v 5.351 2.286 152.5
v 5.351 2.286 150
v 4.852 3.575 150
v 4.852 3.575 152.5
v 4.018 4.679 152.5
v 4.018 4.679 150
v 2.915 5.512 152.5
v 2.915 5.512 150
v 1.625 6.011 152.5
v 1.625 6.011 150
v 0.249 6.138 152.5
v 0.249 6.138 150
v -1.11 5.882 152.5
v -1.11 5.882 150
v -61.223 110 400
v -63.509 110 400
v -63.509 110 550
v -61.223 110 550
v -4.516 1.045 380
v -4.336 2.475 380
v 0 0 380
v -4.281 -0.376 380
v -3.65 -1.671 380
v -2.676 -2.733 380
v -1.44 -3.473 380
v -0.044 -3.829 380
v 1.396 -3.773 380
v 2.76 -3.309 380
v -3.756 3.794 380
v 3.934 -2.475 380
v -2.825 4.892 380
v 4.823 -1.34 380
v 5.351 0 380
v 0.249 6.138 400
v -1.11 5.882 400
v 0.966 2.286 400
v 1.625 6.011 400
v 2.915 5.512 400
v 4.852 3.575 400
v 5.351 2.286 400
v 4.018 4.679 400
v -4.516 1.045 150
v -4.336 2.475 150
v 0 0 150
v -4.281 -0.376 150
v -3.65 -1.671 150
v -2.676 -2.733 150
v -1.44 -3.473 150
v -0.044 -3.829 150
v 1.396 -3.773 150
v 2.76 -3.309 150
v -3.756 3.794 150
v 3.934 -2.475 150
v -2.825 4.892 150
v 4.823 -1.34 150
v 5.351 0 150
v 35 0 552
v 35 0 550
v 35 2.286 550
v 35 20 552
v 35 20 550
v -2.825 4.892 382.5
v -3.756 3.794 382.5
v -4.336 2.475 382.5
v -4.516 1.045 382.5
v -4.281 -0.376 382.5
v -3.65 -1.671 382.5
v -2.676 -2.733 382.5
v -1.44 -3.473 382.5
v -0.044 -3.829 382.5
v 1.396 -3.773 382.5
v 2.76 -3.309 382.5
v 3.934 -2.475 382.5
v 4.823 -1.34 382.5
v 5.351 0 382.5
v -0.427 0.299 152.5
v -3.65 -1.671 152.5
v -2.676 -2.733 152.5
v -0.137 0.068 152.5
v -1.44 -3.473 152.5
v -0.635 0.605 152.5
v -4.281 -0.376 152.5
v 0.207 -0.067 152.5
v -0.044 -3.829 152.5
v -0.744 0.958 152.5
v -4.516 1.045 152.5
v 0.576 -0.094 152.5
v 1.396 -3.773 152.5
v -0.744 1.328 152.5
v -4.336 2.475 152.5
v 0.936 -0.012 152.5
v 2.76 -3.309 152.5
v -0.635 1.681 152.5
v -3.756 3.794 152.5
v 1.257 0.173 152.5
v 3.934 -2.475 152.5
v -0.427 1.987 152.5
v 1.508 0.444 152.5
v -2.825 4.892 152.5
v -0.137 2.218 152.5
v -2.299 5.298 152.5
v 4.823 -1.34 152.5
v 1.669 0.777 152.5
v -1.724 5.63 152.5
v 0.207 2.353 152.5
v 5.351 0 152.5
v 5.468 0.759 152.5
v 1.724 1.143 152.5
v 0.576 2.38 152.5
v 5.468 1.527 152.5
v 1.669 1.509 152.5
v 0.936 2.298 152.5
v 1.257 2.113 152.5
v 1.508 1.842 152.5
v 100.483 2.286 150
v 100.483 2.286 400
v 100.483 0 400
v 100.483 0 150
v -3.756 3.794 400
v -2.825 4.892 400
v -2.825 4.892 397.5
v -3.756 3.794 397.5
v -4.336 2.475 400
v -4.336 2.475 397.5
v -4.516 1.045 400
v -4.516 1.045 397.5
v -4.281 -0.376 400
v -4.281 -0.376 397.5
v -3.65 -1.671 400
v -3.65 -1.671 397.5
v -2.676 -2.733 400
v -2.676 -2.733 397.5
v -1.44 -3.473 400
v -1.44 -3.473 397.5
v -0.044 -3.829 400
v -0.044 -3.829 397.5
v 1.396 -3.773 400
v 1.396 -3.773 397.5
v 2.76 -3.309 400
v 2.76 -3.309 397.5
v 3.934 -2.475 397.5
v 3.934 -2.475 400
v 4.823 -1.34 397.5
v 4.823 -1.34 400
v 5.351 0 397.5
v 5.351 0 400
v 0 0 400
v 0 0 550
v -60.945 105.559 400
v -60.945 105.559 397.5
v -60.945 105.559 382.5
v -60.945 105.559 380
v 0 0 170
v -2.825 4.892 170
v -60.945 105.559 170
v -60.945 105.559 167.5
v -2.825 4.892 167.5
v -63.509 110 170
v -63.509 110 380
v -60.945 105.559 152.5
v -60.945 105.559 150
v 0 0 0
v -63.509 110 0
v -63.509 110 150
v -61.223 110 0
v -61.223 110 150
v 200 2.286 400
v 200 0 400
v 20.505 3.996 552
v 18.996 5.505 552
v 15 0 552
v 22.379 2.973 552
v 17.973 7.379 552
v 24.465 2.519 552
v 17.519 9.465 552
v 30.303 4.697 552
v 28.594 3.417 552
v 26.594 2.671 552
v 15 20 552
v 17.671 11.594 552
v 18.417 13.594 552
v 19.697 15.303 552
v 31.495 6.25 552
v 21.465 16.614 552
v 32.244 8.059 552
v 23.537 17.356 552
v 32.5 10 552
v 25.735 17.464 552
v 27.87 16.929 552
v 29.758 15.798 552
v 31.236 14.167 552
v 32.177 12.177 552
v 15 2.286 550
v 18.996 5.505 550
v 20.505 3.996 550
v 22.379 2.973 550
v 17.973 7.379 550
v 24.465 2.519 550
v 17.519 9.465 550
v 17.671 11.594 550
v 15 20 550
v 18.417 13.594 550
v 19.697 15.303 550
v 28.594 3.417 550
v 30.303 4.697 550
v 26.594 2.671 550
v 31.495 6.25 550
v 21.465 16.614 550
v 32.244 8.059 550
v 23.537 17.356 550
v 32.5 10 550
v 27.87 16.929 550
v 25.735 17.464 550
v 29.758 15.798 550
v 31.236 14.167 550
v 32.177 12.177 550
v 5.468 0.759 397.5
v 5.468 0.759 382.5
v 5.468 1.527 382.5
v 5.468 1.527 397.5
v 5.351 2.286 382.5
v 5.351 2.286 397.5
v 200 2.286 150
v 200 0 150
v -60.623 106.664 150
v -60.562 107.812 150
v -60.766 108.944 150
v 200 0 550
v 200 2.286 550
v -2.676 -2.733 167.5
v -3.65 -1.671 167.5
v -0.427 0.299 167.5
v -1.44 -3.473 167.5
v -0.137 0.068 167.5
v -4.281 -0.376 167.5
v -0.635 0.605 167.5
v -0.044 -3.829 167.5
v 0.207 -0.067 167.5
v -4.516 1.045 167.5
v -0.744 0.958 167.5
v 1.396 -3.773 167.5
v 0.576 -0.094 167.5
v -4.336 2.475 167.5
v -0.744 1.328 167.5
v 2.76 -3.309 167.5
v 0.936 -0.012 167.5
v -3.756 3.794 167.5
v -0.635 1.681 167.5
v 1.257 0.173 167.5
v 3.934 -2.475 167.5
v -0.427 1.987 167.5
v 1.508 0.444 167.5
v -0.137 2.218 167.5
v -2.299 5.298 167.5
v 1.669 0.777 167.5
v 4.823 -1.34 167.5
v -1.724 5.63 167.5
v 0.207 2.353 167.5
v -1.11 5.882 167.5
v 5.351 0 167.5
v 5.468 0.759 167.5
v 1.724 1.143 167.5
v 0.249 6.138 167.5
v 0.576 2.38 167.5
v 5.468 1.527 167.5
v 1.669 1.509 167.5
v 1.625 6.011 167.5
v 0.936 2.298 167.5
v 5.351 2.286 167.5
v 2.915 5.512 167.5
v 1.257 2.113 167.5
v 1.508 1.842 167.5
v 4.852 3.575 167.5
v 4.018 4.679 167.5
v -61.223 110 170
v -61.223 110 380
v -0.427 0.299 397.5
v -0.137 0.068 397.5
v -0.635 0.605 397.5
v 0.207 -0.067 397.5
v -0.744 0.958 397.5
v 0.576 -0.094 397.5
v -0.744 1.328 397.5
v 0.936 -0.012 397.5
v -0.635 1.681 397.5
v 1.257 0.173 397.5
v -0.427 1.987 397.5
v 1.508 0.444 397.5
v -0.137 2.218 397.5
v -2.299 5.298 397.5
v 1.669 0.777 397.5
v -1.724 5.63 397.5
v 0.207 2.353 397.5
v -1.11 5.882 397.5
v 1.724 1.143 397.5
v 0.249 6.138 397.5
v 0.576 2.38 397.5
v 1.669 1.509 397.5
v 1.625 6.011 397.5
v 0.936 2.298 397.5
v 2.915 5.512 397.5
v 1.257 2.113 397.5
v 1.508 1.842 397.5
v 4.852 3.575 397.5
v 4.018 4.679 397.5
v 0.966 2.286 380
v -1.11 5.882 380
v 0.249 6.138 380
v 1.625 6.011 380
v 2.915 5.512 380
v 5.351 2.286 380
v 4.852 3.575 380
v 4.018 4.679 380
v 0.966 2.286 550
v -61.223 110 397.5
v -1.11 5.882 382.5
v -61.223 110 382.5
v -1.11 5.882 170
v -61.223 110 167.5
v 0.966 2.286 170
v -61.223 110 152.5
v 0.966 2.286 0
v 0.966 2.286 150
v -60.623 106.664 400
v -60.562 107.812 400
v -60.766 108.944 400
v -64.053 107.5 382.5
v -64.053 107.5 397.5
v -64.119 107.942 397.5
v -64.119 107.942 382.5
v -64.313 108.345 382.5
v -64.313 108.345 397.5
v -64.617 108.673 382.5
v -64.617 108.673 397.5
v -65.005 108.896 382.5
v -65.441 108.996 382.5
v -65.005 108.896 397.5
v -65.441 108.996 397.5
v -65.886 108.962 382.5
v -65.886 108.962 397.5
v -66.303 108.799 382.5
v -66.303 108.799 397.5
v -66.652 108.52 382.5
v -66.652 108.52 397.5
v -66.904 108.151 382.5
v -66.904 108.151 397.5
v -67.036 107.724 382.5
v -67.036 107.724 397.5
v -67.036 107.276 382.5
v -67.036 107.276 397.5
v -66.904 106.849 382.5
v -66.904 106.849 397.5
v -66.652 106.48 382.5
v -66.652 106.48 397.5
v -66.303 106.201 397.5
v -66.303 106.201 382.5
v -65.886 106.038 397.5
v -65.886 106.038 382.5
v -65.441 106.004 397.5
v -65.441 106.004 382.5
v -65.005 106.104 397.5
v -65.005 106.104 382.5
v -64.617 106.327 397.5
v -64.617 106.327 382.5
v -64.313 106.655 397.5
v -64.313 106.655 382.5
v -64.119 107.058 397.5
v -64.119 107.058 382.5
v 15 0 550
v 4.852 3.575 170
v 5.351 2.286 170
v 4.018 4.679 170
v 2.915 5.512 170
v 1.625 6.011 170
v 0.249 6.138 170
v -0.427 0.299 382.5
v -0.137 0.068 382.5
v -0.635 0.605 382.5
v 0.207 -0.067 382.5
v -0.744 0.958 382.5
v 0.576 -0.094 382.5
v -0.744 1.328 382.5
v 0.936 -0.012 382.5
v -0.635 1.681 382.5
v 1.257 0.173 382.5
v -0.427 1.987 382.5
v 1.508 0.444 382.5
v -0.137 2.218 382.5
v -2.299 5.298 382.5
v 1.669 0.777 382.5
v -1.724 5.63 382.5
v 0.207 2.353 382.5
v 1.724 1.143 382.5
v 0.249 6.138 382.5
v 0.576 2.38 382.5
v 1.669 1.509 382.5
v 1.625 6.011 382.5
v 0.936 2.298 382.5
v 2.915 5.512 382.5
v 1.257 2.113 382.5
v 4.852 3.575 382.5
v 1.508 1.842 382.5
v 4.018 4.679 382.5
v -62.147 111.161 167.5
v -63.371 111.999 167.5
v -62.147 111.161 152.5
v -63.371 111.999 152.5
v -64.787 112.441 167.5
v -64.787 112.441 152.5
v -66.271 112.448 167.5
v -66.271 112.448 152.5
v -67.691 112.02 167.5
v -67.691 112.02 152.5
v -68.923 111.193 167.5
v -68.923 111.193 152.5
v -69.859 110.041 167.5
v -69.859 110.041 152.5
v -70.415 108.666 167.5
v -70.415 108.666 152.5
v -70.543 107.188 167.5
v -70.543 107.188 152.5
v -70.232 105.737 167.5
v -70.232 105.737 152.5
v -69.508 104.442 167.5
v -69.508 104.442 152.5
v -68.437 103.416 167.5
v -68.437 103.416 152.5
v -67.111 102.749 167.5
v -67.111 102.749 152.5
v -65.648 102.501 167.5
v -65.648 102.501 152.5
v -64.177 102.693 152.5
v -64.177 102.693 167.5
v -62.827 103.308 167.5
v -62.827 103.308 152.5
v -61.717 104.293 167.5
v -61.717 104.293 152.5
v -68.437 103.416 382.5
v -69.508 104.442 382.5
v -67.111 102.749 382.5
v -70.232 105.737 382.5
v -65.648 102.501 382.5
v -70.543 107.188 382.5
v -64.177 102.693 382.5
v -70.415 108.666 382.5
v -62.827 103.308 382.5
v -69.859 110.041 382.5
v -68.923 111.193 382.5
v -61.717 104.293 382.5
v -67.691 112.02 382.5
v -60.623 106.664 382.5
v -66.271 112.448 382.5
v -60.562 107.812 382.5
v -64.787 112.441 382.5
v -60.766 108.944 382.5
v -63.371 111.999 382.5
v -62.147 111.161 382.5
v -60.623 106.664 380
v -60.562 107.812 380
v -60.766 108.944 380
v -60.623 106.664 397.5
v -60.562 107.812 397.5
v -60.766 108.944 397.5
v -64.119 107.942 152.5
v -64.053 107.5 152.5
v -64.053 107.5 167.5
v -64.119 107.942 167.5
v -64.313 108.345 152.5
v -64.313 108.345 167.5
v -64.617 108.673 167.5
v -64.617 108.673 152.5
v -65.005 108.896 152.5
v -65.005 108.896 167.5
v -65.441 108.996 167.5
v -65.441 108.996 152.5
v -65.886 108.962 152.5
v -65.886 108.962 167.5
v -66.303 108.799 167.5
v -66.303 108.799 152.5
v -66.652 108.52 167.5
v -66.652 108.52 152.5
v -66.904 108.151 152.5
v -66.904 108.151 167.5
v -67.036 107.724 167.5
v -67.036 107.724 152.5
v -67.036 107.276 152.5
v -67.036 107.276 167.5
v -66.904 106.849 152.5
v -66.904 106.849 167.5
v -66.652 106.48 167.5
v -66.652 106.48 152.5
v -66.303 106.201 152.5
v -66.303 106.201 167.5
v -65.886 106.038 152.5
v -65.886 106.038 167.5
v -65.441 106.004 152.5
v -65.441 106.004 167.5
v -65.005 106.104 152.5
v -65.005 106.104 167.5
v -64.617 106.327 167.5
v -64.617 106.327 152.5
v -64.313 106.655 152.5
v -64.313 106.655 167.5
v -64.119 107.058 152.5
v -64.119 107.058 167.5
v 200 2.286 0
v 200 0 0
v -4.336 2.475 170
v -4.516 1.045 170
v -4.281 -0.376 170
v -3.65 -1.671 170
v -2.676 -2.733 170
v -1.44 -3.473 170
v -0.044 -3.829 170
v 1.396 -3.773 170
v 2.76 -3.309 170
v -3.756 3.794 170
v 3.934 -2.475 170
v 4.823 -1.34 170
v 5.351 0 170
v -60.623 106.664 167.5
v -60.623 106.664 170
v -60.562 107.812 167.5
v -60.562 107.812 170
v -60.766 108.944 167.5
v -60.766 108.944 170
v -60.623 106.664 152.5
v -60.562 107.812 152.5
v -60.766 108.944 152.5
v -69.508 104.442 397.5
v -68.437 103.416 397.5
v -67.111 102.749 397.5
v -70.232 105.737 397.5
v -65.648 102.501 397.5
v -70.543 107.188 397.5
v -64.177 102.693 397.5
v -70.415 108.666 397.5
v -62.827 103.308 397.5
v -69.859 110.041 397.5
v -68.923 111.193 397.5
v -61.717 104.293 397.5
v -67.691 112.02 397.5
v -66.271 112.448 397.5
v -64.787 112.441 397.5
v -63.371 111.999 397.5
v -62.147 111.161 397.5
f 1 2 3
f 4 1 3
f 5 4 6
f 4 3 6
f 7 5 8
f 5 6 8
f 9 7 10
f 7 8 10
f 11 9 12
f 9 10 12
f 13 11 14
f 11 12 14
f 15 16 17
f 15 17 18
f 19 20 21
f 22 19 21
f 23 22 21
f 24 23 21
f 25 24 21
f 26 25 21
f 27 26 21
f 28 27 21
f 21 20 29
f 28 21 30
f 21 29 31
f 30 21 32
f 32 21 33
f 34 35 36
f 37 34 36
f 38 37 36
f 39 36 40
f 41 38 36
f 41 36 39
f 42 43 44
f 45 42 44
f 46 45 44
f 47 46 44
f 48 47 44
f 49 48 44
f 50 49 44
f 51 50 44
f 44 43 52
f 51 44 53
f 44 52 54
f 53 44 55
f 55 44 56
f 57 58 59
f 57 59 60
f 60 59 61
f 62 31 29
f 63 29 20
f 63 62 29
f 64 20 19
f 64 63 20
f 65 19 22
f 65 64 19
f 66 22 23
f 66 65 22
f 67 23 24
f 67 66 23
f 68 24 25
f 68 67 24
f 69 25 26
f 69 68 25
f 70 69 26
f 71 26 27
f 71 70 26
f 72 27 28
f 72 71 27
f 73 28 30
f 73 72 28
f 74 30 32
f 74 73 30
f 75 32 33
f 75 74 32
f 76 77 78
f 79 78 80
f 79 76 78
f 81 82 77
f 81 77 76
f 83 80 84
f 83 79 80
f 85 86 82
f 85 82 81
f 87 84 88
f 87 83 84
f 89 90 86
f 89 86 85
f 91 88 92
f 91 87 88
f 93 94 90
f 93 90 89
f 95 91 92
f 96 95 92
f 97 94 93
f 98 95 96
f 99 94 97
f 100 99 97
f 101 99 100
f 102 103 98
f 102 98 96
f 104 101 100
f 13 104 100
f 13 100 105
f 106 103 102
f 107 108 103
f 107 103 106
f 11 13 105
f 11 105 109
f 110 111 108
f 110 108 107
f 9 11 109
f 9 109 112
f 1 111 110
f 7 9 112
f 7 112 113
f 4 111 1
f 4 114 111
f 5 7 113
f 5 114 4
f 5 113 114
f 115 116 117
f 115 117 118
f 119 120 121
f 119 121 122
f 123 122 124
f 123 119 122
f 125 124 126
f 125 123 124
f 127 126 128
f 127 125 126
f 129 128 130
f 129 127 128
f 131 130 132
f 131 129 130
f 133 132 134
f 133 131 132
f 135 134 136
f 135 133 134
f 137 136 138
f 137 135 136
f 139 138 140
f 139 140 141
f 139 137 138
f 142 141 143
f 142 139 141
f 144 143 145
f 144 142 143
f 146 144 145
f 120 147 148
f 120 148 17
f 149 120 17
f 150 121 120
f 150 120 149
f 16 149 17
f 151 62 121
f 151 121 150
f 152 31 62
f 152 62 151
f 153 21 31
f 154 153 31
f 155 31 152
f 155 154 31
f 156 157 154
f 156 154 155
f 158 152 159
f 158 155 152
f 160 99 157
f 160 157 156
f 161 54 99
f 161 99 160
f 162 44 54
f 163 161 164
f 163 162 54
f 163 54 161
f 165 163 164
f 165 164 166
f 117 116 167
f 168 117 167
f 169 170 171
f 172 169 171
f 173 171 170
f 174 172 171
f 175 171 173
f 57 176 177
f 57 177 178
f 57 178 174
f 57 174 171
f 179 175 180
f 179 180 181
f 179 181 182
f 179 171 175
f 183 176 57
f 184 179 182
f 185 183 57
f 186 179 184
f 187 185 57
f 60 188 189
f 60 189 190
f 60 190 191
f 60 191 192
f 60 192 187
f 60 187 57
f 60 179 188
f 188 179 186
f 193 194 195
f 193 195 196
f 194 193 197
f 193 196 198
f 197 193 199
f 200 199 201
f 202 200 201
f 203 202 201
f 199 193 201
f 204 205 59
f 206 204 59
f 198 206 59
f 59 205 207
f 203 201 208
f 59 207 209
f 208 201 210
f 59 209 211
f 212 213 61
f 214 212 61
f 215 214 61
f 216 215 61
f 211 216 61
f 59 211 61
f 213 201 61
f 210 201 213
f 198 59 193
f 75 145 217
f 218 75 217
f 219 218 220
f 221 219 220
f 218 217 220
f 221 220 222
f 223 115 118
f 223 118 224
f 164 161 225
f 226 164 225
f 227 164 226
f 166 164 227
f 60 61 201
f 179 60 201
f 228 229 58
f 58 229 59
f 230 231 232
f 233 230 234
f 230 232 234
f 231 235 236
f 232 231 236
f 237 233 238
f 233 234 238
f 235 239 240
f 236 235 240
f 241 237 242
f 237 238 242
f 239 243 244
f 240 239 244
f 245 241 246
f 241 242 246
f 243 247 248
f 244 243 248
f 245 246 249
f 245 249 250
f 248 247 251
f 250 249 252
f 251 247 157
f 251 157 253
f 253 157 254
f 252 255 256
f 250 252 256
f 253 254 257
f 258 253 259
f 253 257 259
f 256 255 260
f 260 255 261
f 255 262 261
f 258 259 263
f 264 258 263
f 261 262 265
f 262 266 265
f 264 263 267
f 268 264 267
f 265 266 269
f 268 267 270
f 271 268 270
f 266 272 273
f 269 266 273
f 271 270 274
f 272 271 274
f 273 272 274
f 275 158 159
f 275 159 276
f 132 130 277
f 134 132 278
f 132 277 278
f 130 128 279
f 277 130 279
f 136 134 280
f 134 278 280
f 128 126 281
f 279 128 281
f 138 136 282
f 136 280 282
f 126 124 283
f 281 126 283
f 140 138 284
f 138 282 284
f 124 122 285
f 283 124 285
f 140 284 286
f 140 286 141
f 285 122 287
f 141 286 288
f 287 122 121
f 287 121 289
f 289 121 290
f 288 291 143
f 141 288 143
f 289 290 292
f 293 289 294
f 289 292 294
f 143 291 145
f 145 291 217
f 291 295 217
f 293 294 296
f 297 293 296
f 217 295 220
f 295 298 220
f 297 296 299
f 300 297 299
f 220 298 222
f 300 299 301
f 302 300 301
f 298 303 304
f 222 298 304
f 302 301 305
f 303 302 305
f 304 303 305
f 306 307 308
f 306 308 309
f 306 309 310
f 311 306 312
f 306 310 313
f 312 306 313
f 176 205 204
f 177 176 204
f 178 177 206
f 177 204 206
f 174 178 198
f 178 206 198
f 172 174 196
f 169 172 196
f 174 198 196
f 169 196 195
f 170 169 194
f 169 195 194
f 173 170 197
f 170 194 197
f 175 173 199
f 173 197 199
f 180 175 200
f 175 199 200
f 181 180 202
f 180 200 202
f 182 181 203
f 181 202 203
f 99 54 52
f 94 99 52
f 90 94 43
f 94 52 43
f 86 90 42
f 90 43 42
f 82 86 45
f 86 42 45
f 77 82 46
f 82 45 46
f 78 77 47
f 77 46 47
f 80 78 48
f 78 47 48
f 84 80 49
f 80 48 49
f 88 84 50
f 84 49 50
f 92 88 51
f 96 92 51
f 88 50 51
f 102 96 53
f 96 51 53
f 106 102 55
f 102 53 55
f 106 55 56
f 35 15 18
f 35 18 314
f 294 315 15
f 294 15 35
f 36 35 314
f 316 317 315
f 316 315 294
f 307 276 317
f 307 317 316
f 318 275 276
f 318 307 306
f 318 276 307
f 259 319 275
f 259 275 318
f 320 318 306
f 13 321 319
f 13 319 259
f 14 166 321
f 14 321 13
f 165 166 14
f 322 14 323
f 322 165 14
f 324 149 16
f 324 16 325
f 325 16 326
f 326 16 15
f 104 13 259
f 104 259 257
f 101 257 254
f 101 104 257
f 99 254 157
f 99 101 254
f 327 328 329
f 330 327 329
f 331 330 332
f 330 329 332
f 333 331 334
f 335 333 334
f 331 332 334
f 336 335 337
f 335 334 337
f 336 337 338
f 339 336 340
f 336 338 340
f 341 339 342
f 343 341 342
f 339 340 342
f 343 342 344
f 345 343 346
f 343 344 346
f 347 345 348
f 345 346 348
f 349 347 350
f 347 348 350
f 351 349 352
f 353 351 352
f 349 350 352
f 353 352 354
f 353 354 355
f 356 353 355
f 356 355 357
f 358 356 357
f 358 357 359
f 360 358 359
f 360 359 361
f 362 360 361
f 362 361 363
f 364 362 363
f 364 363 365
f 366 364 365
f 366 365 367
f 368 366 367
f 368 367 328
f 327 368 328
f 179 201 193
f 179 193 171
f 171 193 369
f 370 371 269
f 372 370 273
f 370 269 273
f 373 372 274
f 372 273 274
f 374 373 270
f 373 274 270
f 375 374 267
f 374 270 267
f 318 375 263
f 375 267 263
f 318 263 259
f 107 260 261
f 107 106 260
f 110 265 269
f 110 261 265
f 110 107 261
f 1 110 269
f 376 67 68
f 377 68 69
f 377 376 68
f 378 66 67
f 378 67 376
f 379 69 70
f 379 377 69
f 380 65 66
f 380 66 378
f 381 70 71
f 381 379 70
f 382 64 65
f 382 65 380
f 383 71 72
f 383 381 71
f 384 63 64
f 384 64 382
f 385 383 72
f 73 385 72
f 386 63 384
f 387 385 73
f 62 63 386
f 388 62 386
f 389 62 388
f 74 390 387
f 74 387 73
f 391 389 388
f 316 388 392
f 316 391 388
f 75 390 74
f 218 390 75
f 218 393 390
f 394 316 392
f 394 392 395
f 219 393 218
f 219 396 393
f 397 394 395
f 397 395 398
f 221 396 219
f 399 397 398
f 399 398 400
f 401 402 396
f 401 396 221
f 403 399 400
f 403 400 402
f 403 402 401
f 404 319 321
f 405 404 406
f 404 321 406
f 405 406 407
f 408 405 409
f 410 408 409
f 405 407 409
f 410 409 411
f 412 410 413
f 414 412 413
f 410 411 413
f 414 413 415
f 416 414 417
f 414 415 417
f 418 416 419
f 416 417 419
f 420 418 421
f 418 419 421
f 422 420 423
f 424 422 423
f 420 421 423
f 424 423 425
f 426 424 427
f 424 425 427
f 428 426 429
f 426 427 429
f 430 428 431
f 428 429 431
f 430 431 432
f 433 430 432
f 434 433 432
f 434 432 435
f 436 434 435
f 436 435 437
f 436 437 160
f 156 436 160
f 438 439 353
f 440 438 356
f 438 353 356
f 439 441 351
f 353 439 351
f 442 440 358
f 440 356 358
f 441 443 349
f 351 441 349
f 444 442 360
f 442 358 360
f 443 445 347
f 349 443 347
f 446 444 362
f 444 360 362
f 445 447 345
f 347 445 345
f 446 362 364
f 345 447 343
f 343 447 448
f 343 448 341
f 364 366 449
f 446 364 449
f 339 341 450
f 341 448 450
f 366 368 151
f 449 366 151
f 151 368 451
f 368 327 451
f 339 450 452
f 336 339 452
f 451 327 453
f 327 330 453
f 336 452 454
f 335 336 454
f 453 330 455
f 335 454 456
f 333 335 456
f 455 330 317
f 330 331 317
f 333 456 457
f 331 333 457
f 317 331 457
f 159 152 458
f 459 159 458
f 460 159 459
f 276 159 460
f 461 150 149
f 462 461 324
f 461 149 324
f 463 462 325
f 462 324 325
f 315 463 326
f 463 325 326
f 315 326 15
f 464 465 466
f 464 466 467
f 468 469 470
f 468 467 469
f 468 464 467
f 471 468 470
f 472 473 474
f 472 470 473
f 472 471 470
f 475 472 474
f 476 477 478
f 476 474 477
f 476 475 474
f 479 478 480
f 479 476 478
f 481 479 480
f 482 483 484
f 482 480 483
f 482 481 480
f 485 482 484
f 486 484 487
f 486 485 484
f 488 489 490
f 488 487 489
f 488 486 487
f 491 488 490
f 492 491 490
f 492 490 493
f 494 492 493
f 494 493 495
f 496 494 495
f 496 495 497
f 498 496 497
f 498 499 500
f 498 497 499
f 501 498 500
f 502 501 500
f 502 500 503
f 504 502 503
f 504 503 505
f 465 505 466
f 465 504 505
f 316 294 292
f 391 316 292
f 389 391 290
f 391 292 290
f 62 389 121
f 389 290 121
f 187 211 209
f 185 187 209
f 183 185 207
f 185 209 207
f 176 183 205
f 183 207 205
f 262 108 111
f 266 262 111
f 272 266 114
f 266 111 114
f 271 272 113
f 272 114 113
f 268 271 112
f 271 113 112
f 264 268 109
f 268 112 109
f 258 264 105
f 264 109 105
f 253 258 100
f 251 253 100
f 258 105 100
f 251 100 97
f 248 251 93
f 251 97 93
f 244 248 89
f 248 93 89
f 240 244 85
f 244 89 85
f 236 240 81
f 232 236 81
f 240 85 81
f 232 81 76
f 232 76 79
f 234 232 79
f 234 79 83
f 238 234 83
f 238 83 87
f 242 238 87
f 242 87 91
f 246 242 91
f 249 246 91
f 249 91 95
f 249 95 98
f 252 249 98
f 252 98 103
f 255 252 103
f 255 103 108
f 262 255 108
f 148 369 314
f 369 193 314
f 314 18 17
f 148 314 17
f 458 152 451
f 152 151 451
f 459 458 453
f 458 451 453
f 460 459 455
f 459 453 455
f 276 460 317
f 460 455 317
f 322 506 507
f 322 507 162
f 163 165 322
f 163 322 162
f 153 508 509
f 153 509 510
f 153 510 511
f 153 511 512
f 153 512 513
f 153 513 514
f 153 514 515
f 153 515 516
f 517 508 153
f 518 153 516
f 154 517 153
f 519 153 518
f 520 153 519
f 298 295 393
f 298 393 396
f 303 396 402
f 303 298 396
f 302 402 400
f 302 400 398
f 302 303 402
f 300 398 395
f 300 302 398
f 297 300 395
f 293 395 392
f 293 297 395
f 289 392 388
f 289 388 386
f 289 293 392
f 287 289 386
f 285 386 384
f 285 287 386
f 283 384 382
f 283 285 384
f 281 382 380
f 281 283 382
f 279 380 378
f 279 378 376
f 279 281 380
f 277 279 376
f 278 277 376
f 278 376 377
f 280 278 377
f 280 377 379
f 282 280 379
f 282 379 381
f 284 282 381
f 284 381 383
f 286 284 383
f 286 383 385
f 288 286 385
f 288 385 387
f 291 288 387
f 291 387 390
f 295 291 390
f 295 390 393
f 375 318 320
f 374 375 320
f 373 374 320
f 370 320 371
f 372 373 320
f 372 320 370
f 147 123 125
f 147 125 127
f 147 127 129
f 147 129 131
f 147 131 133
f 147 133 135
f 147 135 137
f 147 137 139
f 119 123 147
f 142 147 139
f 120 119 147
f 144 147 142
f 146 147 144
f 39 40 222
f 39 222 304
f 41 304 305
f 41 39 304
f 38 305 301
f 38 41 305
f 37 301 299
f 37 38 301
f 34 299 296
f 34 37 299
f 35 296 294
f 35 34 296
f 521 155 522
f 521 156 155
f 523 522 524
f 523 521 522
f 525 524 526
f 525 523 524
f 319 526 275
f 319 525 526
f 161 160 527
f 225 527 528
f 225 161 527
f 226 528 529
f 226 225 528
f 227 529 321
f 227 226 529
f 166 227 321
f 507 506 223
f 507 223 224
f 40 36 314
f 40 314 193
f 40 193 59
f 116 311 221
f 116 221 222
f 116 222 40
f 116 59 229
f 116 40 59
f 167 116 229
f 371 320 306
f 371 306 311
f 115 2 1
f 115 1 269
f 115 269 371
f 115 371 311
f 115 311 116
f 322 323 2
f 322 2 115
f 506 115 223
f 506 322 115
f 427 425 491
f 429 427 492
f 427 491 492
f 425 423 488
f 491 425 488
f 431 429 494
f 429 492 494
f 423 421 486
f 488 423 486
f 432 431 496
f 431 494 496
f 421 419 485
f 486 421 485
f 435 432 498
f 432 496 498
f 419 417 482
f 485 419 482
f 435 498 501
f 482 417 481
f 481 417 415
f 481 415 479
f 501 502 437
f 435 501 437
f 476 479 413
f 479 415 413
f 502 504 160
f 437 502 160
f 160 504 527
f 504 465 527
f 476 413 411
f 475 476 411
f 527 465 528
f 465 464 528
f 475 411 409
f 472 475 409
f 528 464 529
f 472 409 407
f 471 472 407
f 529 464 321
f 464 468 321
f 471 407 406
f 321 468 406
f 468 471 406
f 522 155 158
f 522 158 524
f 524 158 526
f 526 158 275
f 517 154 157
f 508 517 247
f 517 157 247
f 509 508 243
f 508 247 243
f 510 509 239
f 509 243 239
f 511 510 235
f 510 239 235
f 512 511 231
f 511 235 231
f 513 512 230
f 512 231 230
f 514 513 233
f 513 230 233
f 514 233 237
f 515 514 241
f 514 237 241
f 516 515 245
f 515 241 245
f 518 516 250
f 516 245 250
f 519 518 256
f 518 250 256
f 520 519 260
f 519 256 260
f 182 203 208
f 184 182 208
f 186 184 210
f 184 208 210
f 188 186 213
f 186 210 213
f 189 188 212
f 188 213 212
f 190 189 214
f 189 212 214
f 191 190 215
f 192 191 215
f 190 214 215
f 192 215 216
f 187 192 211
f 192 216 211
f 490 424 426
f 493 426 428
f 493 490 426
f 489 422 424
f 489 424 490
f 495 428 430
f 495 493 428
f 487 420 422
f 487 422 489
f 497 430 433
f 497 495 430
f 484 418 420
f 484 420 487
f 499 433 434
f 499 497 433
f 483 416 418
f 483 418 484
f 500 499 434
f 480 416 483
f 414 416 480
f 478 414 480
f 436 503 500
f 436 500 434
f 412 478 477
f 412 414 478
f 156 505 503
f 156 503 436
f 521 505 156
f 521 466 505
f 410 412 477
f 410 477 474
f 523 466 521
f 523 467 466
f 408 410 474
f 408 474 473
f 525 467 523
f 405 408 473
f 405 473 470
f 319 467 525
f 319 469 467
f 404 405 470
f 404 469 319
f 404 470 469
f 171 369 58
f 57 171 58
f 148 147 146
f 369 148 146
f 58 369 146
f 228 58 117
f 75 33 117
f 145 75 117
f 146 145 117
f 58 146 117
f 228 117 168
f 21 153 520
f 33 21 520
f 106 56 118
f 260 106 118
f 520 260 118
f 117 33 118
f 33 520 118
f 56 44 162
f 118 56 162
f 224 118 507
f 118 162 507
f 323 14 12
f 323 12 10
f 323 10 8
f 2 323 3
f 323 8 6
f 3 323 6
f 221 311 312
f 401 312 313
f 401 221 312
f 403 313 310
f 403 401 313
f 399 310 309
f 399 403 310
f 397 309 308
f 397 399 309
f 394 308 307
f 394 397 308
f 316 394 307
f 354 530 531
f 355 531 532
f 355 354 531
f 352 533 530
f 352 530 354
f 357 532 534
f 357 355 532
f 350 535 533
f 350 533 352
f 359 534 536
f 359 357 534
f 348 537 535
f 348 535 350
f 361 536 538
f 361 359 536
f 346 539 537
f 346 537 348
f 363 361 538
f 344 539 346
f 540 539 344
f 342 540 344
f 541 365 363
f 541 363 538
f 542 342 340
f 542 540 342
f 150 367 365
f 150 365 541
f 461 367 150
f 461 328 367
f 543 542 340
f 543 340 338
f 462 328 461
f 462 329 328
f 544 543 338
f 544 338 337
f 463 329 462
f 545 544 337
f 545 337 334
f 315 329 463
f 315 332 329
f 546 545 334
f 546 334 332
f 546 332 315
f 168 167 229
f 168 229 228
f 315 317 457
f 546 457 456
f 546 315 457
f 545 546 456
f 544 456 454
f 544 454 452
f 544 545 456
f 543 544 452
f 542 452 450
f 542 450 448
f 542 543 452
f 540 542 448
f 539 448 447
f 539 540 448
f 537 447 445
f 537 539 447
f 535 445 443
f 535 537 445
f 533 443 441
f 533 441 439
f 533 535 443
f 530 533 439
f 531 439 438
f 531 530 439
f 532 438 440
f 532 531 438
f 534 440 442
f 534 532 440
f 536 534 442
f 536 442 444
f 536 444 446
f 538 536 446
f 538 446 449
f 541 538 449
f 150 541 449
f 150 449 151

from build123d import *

# Parameters (mm, degrees)
BOSS_EXTRUDE1_DEPTH = 550
SKETCH2_W           = 99.516911358
SKETCH2_H           = 250
CUT_EXTRUDE1_DEPTH  = 596.064959308
SKETCH4_R           = 5
CUT_EXTRUDE2_DEPTH  = 20
SKETCH4_3_R         = 5
BOSS_EXTRUDE3_DEPTH = 2.5
BOSS_EXTRUDE4_START = 17.5
SKETCH4_5_R         = 5
BOSS_EXTRUDE4_DEPTH = 2.5
SKETCH4_7_R         = 1.240896304
BOSS_EXTRUDE5_DEPTH = 17.5
BOSS_EXTRUDE6_START = -150
SKETCH5_R           = 5
SKETCH5_R_2         = 1.5
BOSS_EXTRUDE6_DEPTH = 19.5
CUT_EXTRUDE5_START  = -167.5
SKETCH5_4_R         = 5
CUT_EXTRUDE5_DEPTH  = 2.5
CUT_EXTRUDE6_START  = -150
SKETCH5_6_R         = 5
CUT_EXTRUDE6_DEPTH  = 2.5
SKETCH7_W           = 20
SKETCH7_H           = 20
SKETCH7_R           = 7.5
BOSS_EXTRUDE7_DEPTH = 2


with BuildPart() as part:
    # Sketch1 → Boss-Extrude1 (new body)
    with BuildSketch(Plane.XY):
        Polygon((0, 0), (-63.508529611, 110), (-61.222529611, 110), (0.966177285, 2.286), (200, 2.286), (200, 0), align=None)
    extrude(amount=BOSS_EXTRUDE1_DEPTH)

    # Sketch2 → Cut-Extrude1 (cut, through all)
    with BuildSketch(Plane(origin=(0, 2.286, 0), x_dir=(1, 0, 0), z_dir=(0, 1, 0))):
        with Locations((150.241544321, -275)):
            Rectangle(SKETCH2_W, SKETCH2_H)
    extrude(amount=-CUT_EXTRUDE1_DEPTH, mode=Mode.SUBTRACT)

    # Sketch4 → Cut-Extrude2 (cut)
    with BuildSketch(Plane.XY.offset(150)):
        with Locations((0.483088642, 1.143)):
            Circle(SKETCH4_R)
    cut_extrude2 = extrude(amount=CUT_EXTRUDE2_DEPTH, mode=Mode.SUBTRACT)

    # Sketch4<3> → Boss-Extrude3 (add)
    with BuildSketch(Plane.XY.offset(150)):
        with Locations((0.483088642, 1.143)):
            Circle(SKETCH4_3_R)
    boss_extrude3 = extrude(amount=BOSS_EXTRUDE3_DEPTH)

    # Sketch4<5> → Boss-Extrude4 (add)
    with BuildSketch(Plane.XY.offset(150).offset(BOSS_EXTRUDE4_START)):
        with Locations((0.483088642, 1.143)):
            Circle(SKETCH4_5_R)
    boss_extrude4 = extrude(amount=BOSS_EXTRUDE4_DEPTH)

    # Sketch4<7> → Boss-Extrude5 (add)
    with BuildSketch(Plane.XY.offset(150)):
        with Locations((0.483088642, 1.143)):
            Circle(SKETCH4_7_R)
    boss_extrude5 = extrude(amount=BOSS_EXTRUDE5_DEPTH)

    # Mirror1: Cut-Extrude2, Boss-Extrude3, Boss-Extrude4, Boss-Extrude5 across plane
    add(cut_extrude2.mirror(Plane.XY.offset(275)), mode=Mode.SUBTRACT)
    add(boss_extrude3.mirror(Plane.XY.offset(275)))
    add(boss_extrude4.mirror(Plane.XY.offset(275)))
    add(boss_extrude5.mirror(Plane.XY.offset(275)))

    # Sketch5 → Boss-Extrude6 (add)
    with BuildSketch(Plane.XY.offset(550).offset(BOSS_EXTRUDE6_START)):
        with Locations((-65.55265663, 107.5)):
            Circle(SKETCH5_R)
        with Locations((-65.55265663, 107.5)):
            Circle(SKETCH5_R_2, mode=Mode.SUBTRACT)
    boss_extrude6 = extrude(amount=-BOSS_EXTRUDE6_DEPTH)

    # Sketch5<4> → Cut-Extrude5 (cut)
    with BuildSketch(Plane.XY.offset(550).offset(CUT_EXTRUDE5_START)):
        with Locations((-65.55265663, 107.5)):
            Circle(SKETCH5_4_R)
    cut_extrude5 = extrude(amount=-CUT_EXTRUDE5_DEPTH, mode=Mode.SUBTRACT)

    # Sketch5<6> → Cut-Extrude6 (cut)
    with BuildSketch(Plane.XY.offset(550).offset(CUT_EXTRUDE6_START)):
        with Locations((-65.55265663, 107.5)):
            Circle(SKETCH5_6_R)
    cut_extrude6 = extrude(amount=-CUT_EXTRUDE6_DEPTH, mode=Mode.SUBTRACT)

    # Mirror2: Boss-Extrude6, Cut-Extrude5, Cut-Extrude6 across plane
    add(boss_extrude6.mirror(Plane.XY.offset(275)))
    add(cut_extrude5.mirror(Plane.XY.offset(275)), mode=Mode.SUBTRACT)
    add(cut_extrude6.mirror(Plane.XY.offset(275)), mode=Mode.SUBTRACT)

    # Sketch7 → Boss-Extrude7 (add)
    with BuildSketch(Plane.XY.offset(550)):
        with Locations((25, 10)):
            Rectangle(SKETCH7_W, SKETCH7_H)
        with Locations((25, 10)):
            Circle(SKETCH7_R, mode=Mode.SUBTRACT)
    extrude(amount=BOSS_EXTRUDE7_DEPTH)


solid = part.part
